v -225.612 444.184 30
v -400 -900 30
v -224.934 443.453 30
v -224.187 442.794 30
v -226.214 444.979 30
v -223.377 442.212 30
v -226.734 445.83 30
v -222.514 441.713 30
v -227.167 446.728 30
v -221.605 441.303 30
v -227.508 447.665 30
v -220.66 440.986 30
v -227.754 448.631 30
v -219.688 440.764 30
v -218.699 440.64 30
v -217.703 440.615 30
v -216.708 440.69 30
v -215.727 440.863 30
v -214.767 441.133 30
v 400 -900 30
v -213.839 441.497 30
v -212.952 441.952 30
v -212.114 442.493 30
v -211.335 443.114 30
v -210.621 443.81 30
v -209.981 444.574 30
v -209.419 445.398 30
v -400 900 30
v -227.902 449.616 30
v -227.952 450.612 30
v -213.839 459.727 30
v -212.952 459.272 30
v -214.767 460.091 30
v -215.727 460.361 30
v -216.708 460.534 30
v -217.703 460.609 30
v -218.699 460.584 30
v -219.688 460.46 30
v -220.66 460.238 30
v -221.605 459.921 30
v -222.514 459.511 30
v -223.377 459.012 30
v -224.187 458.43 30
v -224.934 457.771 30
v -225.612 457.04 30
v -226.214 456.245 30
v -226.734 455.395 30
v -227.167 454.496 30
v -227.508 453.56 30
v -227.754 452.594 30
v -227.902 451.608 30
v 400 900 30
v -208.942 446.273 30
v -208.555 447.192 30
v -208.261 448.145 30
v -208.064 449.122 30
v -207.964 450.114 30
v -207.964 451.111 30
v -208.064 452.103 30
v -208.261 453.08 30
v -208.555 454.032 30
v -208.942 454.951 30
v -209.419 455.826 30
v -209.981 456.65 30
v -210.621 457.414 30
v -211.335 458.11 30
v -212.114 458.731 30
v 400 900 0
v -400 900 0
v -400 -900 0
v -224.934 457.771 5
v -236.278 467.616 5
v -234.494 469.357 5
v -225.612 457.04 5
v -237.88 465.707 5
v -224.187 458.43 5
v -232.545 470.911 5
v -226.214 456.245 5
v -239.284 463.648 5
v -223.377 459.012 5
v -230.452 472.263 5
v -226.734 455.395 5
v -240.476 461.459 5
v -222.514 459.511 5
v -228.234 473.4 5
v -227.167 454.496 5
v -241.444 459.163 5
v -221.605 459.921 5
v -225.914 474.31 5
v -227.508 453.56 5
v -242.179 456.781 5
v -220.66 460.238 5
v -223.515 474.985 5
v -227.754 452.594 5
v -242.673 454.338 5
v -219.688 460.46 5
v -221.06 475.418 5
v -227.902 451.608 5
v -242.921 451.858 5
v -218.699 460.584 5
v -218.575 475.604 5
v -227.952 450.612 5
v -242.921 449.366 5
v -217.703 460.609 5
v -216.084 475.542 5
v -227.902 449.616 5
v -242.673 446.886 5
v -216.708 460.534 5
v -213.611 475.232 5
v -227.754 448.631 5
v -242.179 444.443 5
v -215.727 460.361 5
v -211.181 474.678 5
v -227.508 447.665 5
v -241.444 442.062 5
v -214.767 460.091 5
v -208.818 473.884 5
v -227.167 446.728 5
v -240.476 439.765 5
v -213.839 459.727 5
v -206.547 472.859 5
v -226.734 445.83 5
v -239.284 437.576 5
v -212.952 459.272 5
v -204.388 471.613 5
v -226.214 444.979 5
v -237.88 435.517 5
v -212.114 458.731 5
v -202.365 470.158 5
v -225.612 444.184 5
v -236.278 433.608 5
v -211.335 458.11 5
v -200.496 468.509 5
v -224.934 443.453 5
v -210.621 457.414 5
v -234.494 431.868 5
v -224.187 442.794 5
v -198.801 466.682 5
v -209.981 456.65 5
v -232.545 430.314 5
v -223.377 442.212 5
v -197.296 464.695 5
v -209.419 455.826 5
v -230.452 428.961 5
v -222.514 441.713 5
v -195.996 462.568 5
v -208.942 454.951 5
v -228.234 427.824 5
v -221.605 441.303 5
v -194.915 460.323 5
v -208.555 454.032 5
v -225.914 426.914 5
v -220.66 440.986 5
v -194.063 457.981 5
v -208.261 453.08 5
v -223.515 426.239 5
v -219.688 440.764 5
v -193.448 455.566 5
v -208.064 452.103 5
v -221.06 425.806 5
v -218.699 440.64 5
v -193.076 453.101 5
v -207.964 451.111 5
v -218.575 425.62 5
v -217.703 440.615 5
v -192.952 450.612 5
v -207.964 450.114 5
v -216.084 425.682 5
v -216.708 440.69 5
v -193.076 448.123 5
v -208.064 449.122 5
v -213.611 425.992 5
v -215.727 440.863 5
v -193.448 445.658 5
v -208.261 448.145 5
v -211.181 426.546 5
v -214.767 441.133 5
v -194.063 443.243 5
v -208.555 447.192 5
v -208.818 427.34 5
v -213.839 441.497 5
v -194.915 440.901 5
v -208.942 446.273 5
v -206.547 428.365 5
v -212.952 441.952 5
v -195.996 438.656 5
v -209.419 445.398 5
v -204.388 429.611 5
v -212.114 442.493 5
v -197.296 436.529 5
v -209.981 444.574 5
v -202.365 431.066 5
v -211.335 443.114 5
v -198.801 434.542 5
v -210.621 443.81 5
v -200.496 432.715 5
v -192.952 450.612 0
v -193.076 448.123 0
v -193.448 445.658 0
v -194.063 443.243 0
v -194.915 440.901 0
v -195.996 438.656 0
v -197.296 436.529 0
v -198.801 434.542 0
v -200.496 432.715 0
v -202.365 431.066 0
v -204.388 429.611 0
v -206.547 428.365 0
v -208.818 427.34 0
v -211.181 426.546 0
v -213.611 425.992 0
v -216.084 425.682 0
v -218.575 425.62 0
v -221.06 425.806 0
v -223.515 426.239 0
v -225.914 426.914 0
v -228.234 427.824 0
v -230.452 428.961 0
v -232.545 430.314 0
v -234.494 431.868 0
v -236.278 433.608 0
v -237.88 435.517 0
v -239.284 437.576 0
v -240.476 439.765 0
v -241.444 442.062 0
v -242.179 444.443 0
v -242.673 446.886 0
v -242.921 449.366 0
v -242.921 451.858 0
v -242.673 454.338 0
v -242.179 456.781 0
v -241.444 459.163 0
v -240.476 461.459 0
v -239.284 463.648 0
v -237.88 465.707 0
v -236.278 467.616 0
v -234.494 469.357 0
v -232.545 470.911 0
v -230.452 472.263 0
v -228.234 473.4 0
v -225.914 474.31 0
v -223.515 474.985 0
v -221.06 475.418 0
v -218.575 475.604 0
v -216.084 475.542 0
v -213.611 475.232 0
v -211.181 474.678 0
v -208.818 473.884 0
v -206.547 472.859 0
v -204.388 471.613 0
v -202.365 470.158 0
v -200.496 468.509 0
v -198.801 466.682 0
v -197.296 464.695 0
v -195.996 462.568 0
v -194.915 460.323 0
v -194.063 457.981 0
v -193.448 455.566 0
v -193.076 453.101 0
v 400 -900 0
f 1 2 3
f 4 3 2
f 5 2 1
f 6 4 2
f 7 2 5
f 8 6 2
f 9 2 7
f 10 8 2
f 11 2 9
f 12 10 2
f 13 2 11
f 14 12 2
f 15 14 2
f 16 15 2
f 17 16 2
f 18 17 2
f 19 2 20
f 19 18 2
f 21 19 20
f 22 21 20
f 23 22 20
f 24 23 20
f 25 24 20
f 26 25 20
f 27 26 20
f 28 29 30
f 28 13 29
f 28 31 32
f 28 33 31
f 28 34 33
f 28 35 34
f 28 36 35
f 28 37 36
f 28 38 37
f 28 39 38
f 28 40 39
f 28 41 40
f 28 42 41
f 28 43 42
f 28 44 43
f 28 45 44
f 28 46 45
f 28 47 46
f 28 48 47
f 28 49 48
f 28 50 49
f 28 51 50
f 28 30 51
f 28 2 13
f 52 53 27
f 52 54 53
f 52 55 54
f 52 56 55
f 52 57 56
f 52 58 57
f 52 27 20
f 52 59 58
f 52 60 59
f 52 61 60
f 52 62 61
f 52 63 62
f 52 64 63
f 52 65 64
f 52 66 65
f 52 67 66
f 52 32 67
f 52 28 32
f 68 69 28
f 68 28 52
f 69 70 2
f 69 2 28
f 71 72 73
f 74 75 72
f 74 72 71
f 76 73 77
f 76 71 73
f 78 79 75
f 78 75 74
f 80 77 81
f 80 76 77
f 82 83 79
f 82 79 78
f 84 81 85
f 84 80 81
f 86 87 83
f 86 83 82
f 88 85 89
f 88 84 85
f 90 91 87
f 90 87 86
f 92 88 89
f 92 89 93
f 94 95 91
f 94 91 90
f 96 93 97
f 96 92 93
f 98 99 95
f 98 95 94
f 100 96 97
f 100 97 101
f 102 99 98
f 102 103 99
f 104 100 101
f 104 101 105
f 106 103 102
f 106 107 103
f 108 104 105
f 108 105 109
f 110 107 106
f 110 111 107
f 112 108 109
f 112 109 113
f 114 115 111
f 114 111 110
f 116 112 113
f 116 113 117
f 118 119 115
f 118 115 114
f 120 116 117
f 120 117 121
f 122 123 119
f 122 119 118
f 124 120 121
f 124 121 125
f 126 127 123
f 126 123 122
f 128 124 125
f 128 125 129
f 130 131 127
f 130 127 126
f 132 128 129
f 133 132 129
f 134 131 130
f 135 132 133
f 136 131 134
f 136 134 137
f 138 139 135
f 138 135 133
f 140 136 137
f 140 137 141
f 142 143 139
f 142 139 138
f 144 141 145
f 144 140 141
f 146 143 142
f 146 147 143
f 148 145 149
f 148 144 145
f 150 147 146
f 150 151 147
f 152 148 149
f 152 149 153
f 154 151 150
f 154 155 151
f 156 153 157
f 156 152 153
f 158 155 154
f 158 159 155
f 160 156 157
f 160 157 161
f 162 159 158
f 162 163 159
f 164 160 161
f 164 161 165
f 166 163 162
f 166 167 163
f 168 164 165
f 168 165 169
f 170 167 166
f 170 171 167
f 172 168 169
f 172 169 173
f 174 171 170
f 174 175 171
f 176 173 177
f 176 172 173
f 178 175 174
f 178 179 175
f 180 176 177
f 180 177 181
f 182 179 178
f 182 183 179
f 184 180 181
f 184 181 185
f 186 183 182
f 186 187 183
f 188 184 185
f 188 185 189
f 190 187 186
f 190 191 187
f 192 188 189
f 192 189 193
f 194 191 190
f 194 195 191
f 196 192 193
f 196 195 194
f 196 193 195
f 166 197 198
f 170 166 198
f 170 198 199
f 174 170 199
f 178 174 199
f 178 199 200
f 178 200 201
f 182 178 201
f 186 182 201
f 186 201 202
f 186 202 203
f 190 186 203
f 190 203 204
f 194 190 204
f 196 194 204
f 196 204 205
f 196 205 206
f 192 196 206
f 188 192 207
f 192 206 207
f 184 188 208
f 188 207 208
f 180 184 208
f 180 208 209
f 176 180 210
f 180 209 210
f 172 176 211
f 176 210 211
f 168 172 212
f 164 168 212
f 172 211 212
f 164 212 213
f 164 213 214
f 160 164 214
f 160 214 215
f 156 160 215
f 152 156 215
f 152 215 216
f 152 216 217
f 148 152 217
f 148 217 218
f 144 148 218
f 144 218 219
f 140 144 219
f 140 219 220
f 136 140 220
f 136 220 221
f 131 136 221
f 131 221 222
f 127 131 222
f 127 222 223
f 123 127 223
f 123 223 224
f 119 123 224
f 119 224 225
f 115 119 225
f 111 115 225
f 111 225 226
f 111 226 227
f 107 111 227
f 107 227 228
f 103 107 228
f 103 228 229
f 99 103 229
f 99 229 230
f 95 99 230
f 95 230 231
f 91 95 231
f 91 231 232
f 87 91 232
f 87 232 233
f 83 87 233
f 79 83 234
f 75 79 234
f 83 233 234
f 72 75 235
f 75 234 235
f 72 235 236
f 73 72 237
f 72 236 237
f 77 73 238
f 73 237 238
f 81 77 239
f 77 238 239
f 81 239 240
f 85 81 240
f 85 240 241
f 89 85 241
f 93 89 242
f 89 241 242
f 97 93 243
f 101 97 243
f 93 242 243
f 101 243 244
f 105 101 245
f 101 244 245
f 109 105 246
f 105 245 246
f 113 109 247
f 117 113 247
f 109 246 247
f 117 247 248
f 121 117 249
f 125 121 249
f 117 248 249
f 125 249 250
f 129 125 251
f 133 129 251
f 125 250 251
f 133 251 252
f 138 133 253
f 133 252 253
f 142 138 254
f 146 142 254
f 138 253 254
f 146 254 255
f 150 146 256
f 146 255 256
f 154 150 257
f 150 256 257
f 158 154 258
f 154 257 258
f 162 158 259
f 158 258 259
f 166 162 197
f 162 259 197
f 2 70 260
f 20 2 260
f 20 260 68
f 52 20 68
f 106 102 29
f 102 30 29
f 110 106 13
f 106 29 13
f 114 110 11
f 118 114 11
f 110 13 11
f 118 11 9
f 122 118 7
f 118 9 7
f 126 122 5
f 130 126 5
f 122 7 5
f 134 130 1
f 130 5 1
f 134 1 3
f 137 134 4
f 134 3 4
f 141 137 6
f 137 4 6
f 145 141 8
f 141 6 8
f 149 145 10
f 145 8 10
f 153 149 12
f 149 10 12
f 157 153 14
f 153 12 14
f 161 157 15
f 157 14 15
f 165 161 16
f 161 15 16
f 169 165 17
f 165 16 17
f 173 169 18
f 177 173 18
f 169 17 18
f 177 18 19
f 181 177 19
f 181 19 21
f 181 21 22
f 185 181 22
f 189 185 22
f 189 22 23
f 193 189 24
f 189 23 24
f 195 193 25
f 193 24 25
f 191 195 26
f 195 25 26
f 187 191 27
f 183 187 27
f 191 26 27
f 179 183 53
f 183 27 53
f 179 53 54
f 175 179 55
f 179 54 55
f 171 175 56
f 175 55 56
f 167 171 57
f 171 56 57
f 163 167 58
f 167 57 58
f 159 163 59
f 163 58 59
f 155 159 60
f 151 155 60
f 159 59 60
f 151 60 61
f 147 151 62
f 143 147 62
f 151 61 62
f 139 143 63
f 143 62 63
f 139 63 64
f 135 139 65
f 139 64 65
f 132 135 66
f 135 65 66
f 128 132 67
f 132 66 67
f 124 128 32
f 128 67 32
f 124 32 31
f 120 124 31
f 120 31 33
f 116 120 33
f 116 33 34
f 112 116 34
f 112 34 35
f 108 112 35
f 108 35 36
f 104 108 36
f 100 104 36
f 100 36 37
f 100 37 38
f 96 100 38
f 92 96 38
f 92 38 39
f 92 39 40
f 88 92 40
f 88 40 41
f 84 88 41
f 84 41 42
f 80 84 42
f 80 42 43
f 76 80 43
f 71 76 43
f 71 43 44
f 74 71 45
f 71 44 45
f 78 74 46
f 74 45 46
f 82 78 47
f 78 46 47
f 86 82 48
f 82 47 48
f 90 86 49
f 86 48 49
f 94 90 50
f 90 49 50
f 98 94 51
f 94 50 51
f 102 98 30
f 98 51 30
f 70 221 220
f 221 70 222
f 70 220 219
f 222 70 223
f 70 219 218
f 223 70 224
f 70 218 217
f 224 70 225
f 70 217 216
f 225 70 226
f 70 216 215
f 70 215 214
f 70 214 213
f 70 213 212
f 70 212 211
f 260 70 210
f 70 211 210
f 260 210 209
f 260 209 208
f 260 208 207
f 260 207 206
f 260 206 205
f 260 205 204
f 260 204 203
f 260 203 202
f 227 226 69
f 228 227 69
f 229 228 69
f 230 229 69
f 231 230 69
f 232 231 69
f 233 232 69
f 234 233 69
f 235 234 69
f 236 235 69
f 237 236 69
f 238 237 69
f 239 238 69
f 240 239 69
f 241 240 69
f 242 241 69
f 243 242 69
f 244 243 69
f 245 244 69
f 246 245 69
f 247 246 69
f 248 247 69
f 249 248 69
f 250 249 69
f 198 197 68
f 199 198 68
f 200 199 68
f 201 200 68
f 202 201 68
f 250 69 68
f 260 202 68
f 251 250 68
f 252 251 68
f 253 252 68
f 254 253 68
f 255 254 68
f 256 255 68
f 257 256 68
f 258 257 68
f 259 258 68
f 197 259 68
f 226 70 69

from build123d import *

# Parameters (mm, degrees)
F0_W           = 800
F0_H           = 1800
F1_DEPTH       = 30
F3_D           = 20
F3_CBORE_D     = 50
F3_CBORE_DEPTH = 5


with BuildPart() as f1:
    # F0 (on Top) → F1 (new body)
    with BuildSketch(Plane.XY):
        Rectangle(F0_W, F0_H)
    extrude(amount=F1_DEPTH)

    # F3 (through all)
    with Locations(Plane(origin=(0, 0, 0), x_dir=(1, 0, 0), z_dir=(0, 0, -1))):
        with Locations((-217.951849103, -450.6120979786)):
            CounterBoreHole(F3_D / 2, F3_CBORE_D / 2, F3_CBORE_DEPTH)


solid = f1.part
